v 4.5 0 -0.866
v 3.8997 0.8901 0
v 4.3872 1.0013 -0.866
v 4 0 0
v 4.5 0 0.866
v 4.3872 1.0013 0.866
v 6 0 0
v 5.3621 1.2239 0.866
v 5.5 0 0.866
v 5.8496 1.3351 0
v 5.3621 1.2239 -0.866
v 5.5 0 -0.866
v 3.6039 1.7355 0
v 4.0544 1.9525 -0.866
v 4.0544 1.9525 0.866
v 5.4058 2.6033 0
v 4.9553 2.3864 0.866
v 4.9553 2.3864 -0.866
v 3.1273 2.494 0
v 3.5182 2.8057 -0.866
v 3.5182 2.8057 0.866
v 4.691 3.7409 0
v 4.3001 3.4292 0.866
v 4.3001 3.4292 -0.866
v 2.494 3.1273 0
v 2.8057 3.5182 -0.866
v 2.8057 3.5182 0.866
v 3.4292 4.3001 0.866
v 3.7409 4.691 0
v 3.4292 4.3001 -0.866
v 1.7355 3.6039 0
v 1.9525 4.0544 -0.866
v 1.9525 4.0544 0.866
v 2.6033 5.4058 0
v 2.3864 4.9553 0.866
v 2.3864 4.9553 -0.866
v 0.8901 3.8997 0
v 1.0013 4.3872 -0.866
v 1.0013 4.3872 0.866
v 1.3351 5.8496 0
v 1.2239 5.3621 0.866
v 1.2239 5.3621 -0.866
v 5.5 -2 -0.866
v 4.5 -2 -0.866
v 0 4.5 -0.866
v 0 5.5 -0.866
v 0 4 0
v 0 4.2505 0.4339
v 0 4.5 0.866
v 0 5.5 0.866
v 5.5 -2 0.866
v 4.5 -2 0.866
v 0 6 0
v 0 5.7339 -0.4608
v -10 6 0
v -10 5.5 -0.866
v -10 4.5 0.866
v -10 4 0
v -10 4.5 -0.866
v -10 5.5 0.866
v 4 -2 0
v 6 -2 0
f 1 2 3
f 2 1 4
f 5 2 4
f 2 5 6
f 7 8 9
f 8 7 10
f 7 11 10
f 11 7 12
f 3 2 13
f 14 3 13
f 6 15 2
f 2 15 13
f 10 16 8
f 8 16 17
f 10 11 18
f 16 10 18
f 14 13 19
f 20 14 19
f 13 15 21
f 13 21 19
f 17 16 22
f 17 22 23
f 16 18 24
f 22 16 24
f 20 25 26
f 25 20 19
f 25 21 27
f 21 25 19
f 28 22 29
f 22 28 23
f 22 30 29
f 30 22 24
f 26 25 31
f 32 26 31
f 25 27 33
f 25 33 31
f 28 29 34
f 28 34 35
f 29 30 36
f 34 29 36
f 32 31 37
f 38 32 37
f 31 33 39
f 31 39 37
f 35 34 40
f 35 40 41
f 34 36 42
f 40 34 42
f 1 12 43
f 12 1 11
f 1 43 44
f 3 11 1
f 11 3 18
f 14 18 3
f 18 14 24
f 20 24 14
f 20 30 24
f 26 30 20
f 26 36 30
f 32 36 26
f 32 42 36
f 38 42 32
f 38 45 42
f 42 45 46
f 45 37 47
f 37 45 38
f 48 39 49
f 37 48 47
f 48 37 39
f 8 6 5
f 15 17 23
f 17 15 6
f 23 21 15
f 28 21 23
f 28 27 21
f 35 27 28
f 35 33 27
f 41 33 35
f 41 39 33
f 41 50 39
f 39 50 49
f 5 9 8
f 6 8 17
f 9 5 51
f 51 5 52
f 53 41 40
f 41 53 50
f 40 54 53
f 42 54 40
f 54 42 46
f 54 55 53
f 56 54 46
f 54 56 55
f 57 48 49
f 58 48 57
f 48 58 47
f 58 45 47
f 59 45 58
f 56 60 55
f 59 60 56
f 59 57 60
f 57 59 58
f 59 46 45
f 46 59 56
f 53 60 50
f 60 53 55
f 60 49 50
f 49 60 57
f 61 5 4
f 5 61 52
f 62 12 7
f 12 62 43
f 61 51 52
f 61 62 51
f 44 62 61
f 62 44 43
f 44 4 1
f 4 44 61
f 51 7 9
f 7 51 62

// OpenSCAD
module regular_polygon(order = 6, r=1){
     angles=[ for (i = [0:order-1]) i*(360/order) ];
     coords=[ for (th=angles) [r*cos(th), r*sin(th)] ];
     polygon(coords);
 }
 

rotate_extrude(angle = 90, $fn = 30)
translate([5,0,0])
regular_polygon(); 
 
translate([0,5,0])

rotate([30,0,0])
rotate([00,-90,00])
linear_extrude(height = 10) 

//translate([5,0,0])
regular_polygon(); 
 
 
translate([5,0,0])
rotate([90,-0,00])
linear_extrude(height = 2) 

//translate([5,0,0])
regular_polygon(); 
  
